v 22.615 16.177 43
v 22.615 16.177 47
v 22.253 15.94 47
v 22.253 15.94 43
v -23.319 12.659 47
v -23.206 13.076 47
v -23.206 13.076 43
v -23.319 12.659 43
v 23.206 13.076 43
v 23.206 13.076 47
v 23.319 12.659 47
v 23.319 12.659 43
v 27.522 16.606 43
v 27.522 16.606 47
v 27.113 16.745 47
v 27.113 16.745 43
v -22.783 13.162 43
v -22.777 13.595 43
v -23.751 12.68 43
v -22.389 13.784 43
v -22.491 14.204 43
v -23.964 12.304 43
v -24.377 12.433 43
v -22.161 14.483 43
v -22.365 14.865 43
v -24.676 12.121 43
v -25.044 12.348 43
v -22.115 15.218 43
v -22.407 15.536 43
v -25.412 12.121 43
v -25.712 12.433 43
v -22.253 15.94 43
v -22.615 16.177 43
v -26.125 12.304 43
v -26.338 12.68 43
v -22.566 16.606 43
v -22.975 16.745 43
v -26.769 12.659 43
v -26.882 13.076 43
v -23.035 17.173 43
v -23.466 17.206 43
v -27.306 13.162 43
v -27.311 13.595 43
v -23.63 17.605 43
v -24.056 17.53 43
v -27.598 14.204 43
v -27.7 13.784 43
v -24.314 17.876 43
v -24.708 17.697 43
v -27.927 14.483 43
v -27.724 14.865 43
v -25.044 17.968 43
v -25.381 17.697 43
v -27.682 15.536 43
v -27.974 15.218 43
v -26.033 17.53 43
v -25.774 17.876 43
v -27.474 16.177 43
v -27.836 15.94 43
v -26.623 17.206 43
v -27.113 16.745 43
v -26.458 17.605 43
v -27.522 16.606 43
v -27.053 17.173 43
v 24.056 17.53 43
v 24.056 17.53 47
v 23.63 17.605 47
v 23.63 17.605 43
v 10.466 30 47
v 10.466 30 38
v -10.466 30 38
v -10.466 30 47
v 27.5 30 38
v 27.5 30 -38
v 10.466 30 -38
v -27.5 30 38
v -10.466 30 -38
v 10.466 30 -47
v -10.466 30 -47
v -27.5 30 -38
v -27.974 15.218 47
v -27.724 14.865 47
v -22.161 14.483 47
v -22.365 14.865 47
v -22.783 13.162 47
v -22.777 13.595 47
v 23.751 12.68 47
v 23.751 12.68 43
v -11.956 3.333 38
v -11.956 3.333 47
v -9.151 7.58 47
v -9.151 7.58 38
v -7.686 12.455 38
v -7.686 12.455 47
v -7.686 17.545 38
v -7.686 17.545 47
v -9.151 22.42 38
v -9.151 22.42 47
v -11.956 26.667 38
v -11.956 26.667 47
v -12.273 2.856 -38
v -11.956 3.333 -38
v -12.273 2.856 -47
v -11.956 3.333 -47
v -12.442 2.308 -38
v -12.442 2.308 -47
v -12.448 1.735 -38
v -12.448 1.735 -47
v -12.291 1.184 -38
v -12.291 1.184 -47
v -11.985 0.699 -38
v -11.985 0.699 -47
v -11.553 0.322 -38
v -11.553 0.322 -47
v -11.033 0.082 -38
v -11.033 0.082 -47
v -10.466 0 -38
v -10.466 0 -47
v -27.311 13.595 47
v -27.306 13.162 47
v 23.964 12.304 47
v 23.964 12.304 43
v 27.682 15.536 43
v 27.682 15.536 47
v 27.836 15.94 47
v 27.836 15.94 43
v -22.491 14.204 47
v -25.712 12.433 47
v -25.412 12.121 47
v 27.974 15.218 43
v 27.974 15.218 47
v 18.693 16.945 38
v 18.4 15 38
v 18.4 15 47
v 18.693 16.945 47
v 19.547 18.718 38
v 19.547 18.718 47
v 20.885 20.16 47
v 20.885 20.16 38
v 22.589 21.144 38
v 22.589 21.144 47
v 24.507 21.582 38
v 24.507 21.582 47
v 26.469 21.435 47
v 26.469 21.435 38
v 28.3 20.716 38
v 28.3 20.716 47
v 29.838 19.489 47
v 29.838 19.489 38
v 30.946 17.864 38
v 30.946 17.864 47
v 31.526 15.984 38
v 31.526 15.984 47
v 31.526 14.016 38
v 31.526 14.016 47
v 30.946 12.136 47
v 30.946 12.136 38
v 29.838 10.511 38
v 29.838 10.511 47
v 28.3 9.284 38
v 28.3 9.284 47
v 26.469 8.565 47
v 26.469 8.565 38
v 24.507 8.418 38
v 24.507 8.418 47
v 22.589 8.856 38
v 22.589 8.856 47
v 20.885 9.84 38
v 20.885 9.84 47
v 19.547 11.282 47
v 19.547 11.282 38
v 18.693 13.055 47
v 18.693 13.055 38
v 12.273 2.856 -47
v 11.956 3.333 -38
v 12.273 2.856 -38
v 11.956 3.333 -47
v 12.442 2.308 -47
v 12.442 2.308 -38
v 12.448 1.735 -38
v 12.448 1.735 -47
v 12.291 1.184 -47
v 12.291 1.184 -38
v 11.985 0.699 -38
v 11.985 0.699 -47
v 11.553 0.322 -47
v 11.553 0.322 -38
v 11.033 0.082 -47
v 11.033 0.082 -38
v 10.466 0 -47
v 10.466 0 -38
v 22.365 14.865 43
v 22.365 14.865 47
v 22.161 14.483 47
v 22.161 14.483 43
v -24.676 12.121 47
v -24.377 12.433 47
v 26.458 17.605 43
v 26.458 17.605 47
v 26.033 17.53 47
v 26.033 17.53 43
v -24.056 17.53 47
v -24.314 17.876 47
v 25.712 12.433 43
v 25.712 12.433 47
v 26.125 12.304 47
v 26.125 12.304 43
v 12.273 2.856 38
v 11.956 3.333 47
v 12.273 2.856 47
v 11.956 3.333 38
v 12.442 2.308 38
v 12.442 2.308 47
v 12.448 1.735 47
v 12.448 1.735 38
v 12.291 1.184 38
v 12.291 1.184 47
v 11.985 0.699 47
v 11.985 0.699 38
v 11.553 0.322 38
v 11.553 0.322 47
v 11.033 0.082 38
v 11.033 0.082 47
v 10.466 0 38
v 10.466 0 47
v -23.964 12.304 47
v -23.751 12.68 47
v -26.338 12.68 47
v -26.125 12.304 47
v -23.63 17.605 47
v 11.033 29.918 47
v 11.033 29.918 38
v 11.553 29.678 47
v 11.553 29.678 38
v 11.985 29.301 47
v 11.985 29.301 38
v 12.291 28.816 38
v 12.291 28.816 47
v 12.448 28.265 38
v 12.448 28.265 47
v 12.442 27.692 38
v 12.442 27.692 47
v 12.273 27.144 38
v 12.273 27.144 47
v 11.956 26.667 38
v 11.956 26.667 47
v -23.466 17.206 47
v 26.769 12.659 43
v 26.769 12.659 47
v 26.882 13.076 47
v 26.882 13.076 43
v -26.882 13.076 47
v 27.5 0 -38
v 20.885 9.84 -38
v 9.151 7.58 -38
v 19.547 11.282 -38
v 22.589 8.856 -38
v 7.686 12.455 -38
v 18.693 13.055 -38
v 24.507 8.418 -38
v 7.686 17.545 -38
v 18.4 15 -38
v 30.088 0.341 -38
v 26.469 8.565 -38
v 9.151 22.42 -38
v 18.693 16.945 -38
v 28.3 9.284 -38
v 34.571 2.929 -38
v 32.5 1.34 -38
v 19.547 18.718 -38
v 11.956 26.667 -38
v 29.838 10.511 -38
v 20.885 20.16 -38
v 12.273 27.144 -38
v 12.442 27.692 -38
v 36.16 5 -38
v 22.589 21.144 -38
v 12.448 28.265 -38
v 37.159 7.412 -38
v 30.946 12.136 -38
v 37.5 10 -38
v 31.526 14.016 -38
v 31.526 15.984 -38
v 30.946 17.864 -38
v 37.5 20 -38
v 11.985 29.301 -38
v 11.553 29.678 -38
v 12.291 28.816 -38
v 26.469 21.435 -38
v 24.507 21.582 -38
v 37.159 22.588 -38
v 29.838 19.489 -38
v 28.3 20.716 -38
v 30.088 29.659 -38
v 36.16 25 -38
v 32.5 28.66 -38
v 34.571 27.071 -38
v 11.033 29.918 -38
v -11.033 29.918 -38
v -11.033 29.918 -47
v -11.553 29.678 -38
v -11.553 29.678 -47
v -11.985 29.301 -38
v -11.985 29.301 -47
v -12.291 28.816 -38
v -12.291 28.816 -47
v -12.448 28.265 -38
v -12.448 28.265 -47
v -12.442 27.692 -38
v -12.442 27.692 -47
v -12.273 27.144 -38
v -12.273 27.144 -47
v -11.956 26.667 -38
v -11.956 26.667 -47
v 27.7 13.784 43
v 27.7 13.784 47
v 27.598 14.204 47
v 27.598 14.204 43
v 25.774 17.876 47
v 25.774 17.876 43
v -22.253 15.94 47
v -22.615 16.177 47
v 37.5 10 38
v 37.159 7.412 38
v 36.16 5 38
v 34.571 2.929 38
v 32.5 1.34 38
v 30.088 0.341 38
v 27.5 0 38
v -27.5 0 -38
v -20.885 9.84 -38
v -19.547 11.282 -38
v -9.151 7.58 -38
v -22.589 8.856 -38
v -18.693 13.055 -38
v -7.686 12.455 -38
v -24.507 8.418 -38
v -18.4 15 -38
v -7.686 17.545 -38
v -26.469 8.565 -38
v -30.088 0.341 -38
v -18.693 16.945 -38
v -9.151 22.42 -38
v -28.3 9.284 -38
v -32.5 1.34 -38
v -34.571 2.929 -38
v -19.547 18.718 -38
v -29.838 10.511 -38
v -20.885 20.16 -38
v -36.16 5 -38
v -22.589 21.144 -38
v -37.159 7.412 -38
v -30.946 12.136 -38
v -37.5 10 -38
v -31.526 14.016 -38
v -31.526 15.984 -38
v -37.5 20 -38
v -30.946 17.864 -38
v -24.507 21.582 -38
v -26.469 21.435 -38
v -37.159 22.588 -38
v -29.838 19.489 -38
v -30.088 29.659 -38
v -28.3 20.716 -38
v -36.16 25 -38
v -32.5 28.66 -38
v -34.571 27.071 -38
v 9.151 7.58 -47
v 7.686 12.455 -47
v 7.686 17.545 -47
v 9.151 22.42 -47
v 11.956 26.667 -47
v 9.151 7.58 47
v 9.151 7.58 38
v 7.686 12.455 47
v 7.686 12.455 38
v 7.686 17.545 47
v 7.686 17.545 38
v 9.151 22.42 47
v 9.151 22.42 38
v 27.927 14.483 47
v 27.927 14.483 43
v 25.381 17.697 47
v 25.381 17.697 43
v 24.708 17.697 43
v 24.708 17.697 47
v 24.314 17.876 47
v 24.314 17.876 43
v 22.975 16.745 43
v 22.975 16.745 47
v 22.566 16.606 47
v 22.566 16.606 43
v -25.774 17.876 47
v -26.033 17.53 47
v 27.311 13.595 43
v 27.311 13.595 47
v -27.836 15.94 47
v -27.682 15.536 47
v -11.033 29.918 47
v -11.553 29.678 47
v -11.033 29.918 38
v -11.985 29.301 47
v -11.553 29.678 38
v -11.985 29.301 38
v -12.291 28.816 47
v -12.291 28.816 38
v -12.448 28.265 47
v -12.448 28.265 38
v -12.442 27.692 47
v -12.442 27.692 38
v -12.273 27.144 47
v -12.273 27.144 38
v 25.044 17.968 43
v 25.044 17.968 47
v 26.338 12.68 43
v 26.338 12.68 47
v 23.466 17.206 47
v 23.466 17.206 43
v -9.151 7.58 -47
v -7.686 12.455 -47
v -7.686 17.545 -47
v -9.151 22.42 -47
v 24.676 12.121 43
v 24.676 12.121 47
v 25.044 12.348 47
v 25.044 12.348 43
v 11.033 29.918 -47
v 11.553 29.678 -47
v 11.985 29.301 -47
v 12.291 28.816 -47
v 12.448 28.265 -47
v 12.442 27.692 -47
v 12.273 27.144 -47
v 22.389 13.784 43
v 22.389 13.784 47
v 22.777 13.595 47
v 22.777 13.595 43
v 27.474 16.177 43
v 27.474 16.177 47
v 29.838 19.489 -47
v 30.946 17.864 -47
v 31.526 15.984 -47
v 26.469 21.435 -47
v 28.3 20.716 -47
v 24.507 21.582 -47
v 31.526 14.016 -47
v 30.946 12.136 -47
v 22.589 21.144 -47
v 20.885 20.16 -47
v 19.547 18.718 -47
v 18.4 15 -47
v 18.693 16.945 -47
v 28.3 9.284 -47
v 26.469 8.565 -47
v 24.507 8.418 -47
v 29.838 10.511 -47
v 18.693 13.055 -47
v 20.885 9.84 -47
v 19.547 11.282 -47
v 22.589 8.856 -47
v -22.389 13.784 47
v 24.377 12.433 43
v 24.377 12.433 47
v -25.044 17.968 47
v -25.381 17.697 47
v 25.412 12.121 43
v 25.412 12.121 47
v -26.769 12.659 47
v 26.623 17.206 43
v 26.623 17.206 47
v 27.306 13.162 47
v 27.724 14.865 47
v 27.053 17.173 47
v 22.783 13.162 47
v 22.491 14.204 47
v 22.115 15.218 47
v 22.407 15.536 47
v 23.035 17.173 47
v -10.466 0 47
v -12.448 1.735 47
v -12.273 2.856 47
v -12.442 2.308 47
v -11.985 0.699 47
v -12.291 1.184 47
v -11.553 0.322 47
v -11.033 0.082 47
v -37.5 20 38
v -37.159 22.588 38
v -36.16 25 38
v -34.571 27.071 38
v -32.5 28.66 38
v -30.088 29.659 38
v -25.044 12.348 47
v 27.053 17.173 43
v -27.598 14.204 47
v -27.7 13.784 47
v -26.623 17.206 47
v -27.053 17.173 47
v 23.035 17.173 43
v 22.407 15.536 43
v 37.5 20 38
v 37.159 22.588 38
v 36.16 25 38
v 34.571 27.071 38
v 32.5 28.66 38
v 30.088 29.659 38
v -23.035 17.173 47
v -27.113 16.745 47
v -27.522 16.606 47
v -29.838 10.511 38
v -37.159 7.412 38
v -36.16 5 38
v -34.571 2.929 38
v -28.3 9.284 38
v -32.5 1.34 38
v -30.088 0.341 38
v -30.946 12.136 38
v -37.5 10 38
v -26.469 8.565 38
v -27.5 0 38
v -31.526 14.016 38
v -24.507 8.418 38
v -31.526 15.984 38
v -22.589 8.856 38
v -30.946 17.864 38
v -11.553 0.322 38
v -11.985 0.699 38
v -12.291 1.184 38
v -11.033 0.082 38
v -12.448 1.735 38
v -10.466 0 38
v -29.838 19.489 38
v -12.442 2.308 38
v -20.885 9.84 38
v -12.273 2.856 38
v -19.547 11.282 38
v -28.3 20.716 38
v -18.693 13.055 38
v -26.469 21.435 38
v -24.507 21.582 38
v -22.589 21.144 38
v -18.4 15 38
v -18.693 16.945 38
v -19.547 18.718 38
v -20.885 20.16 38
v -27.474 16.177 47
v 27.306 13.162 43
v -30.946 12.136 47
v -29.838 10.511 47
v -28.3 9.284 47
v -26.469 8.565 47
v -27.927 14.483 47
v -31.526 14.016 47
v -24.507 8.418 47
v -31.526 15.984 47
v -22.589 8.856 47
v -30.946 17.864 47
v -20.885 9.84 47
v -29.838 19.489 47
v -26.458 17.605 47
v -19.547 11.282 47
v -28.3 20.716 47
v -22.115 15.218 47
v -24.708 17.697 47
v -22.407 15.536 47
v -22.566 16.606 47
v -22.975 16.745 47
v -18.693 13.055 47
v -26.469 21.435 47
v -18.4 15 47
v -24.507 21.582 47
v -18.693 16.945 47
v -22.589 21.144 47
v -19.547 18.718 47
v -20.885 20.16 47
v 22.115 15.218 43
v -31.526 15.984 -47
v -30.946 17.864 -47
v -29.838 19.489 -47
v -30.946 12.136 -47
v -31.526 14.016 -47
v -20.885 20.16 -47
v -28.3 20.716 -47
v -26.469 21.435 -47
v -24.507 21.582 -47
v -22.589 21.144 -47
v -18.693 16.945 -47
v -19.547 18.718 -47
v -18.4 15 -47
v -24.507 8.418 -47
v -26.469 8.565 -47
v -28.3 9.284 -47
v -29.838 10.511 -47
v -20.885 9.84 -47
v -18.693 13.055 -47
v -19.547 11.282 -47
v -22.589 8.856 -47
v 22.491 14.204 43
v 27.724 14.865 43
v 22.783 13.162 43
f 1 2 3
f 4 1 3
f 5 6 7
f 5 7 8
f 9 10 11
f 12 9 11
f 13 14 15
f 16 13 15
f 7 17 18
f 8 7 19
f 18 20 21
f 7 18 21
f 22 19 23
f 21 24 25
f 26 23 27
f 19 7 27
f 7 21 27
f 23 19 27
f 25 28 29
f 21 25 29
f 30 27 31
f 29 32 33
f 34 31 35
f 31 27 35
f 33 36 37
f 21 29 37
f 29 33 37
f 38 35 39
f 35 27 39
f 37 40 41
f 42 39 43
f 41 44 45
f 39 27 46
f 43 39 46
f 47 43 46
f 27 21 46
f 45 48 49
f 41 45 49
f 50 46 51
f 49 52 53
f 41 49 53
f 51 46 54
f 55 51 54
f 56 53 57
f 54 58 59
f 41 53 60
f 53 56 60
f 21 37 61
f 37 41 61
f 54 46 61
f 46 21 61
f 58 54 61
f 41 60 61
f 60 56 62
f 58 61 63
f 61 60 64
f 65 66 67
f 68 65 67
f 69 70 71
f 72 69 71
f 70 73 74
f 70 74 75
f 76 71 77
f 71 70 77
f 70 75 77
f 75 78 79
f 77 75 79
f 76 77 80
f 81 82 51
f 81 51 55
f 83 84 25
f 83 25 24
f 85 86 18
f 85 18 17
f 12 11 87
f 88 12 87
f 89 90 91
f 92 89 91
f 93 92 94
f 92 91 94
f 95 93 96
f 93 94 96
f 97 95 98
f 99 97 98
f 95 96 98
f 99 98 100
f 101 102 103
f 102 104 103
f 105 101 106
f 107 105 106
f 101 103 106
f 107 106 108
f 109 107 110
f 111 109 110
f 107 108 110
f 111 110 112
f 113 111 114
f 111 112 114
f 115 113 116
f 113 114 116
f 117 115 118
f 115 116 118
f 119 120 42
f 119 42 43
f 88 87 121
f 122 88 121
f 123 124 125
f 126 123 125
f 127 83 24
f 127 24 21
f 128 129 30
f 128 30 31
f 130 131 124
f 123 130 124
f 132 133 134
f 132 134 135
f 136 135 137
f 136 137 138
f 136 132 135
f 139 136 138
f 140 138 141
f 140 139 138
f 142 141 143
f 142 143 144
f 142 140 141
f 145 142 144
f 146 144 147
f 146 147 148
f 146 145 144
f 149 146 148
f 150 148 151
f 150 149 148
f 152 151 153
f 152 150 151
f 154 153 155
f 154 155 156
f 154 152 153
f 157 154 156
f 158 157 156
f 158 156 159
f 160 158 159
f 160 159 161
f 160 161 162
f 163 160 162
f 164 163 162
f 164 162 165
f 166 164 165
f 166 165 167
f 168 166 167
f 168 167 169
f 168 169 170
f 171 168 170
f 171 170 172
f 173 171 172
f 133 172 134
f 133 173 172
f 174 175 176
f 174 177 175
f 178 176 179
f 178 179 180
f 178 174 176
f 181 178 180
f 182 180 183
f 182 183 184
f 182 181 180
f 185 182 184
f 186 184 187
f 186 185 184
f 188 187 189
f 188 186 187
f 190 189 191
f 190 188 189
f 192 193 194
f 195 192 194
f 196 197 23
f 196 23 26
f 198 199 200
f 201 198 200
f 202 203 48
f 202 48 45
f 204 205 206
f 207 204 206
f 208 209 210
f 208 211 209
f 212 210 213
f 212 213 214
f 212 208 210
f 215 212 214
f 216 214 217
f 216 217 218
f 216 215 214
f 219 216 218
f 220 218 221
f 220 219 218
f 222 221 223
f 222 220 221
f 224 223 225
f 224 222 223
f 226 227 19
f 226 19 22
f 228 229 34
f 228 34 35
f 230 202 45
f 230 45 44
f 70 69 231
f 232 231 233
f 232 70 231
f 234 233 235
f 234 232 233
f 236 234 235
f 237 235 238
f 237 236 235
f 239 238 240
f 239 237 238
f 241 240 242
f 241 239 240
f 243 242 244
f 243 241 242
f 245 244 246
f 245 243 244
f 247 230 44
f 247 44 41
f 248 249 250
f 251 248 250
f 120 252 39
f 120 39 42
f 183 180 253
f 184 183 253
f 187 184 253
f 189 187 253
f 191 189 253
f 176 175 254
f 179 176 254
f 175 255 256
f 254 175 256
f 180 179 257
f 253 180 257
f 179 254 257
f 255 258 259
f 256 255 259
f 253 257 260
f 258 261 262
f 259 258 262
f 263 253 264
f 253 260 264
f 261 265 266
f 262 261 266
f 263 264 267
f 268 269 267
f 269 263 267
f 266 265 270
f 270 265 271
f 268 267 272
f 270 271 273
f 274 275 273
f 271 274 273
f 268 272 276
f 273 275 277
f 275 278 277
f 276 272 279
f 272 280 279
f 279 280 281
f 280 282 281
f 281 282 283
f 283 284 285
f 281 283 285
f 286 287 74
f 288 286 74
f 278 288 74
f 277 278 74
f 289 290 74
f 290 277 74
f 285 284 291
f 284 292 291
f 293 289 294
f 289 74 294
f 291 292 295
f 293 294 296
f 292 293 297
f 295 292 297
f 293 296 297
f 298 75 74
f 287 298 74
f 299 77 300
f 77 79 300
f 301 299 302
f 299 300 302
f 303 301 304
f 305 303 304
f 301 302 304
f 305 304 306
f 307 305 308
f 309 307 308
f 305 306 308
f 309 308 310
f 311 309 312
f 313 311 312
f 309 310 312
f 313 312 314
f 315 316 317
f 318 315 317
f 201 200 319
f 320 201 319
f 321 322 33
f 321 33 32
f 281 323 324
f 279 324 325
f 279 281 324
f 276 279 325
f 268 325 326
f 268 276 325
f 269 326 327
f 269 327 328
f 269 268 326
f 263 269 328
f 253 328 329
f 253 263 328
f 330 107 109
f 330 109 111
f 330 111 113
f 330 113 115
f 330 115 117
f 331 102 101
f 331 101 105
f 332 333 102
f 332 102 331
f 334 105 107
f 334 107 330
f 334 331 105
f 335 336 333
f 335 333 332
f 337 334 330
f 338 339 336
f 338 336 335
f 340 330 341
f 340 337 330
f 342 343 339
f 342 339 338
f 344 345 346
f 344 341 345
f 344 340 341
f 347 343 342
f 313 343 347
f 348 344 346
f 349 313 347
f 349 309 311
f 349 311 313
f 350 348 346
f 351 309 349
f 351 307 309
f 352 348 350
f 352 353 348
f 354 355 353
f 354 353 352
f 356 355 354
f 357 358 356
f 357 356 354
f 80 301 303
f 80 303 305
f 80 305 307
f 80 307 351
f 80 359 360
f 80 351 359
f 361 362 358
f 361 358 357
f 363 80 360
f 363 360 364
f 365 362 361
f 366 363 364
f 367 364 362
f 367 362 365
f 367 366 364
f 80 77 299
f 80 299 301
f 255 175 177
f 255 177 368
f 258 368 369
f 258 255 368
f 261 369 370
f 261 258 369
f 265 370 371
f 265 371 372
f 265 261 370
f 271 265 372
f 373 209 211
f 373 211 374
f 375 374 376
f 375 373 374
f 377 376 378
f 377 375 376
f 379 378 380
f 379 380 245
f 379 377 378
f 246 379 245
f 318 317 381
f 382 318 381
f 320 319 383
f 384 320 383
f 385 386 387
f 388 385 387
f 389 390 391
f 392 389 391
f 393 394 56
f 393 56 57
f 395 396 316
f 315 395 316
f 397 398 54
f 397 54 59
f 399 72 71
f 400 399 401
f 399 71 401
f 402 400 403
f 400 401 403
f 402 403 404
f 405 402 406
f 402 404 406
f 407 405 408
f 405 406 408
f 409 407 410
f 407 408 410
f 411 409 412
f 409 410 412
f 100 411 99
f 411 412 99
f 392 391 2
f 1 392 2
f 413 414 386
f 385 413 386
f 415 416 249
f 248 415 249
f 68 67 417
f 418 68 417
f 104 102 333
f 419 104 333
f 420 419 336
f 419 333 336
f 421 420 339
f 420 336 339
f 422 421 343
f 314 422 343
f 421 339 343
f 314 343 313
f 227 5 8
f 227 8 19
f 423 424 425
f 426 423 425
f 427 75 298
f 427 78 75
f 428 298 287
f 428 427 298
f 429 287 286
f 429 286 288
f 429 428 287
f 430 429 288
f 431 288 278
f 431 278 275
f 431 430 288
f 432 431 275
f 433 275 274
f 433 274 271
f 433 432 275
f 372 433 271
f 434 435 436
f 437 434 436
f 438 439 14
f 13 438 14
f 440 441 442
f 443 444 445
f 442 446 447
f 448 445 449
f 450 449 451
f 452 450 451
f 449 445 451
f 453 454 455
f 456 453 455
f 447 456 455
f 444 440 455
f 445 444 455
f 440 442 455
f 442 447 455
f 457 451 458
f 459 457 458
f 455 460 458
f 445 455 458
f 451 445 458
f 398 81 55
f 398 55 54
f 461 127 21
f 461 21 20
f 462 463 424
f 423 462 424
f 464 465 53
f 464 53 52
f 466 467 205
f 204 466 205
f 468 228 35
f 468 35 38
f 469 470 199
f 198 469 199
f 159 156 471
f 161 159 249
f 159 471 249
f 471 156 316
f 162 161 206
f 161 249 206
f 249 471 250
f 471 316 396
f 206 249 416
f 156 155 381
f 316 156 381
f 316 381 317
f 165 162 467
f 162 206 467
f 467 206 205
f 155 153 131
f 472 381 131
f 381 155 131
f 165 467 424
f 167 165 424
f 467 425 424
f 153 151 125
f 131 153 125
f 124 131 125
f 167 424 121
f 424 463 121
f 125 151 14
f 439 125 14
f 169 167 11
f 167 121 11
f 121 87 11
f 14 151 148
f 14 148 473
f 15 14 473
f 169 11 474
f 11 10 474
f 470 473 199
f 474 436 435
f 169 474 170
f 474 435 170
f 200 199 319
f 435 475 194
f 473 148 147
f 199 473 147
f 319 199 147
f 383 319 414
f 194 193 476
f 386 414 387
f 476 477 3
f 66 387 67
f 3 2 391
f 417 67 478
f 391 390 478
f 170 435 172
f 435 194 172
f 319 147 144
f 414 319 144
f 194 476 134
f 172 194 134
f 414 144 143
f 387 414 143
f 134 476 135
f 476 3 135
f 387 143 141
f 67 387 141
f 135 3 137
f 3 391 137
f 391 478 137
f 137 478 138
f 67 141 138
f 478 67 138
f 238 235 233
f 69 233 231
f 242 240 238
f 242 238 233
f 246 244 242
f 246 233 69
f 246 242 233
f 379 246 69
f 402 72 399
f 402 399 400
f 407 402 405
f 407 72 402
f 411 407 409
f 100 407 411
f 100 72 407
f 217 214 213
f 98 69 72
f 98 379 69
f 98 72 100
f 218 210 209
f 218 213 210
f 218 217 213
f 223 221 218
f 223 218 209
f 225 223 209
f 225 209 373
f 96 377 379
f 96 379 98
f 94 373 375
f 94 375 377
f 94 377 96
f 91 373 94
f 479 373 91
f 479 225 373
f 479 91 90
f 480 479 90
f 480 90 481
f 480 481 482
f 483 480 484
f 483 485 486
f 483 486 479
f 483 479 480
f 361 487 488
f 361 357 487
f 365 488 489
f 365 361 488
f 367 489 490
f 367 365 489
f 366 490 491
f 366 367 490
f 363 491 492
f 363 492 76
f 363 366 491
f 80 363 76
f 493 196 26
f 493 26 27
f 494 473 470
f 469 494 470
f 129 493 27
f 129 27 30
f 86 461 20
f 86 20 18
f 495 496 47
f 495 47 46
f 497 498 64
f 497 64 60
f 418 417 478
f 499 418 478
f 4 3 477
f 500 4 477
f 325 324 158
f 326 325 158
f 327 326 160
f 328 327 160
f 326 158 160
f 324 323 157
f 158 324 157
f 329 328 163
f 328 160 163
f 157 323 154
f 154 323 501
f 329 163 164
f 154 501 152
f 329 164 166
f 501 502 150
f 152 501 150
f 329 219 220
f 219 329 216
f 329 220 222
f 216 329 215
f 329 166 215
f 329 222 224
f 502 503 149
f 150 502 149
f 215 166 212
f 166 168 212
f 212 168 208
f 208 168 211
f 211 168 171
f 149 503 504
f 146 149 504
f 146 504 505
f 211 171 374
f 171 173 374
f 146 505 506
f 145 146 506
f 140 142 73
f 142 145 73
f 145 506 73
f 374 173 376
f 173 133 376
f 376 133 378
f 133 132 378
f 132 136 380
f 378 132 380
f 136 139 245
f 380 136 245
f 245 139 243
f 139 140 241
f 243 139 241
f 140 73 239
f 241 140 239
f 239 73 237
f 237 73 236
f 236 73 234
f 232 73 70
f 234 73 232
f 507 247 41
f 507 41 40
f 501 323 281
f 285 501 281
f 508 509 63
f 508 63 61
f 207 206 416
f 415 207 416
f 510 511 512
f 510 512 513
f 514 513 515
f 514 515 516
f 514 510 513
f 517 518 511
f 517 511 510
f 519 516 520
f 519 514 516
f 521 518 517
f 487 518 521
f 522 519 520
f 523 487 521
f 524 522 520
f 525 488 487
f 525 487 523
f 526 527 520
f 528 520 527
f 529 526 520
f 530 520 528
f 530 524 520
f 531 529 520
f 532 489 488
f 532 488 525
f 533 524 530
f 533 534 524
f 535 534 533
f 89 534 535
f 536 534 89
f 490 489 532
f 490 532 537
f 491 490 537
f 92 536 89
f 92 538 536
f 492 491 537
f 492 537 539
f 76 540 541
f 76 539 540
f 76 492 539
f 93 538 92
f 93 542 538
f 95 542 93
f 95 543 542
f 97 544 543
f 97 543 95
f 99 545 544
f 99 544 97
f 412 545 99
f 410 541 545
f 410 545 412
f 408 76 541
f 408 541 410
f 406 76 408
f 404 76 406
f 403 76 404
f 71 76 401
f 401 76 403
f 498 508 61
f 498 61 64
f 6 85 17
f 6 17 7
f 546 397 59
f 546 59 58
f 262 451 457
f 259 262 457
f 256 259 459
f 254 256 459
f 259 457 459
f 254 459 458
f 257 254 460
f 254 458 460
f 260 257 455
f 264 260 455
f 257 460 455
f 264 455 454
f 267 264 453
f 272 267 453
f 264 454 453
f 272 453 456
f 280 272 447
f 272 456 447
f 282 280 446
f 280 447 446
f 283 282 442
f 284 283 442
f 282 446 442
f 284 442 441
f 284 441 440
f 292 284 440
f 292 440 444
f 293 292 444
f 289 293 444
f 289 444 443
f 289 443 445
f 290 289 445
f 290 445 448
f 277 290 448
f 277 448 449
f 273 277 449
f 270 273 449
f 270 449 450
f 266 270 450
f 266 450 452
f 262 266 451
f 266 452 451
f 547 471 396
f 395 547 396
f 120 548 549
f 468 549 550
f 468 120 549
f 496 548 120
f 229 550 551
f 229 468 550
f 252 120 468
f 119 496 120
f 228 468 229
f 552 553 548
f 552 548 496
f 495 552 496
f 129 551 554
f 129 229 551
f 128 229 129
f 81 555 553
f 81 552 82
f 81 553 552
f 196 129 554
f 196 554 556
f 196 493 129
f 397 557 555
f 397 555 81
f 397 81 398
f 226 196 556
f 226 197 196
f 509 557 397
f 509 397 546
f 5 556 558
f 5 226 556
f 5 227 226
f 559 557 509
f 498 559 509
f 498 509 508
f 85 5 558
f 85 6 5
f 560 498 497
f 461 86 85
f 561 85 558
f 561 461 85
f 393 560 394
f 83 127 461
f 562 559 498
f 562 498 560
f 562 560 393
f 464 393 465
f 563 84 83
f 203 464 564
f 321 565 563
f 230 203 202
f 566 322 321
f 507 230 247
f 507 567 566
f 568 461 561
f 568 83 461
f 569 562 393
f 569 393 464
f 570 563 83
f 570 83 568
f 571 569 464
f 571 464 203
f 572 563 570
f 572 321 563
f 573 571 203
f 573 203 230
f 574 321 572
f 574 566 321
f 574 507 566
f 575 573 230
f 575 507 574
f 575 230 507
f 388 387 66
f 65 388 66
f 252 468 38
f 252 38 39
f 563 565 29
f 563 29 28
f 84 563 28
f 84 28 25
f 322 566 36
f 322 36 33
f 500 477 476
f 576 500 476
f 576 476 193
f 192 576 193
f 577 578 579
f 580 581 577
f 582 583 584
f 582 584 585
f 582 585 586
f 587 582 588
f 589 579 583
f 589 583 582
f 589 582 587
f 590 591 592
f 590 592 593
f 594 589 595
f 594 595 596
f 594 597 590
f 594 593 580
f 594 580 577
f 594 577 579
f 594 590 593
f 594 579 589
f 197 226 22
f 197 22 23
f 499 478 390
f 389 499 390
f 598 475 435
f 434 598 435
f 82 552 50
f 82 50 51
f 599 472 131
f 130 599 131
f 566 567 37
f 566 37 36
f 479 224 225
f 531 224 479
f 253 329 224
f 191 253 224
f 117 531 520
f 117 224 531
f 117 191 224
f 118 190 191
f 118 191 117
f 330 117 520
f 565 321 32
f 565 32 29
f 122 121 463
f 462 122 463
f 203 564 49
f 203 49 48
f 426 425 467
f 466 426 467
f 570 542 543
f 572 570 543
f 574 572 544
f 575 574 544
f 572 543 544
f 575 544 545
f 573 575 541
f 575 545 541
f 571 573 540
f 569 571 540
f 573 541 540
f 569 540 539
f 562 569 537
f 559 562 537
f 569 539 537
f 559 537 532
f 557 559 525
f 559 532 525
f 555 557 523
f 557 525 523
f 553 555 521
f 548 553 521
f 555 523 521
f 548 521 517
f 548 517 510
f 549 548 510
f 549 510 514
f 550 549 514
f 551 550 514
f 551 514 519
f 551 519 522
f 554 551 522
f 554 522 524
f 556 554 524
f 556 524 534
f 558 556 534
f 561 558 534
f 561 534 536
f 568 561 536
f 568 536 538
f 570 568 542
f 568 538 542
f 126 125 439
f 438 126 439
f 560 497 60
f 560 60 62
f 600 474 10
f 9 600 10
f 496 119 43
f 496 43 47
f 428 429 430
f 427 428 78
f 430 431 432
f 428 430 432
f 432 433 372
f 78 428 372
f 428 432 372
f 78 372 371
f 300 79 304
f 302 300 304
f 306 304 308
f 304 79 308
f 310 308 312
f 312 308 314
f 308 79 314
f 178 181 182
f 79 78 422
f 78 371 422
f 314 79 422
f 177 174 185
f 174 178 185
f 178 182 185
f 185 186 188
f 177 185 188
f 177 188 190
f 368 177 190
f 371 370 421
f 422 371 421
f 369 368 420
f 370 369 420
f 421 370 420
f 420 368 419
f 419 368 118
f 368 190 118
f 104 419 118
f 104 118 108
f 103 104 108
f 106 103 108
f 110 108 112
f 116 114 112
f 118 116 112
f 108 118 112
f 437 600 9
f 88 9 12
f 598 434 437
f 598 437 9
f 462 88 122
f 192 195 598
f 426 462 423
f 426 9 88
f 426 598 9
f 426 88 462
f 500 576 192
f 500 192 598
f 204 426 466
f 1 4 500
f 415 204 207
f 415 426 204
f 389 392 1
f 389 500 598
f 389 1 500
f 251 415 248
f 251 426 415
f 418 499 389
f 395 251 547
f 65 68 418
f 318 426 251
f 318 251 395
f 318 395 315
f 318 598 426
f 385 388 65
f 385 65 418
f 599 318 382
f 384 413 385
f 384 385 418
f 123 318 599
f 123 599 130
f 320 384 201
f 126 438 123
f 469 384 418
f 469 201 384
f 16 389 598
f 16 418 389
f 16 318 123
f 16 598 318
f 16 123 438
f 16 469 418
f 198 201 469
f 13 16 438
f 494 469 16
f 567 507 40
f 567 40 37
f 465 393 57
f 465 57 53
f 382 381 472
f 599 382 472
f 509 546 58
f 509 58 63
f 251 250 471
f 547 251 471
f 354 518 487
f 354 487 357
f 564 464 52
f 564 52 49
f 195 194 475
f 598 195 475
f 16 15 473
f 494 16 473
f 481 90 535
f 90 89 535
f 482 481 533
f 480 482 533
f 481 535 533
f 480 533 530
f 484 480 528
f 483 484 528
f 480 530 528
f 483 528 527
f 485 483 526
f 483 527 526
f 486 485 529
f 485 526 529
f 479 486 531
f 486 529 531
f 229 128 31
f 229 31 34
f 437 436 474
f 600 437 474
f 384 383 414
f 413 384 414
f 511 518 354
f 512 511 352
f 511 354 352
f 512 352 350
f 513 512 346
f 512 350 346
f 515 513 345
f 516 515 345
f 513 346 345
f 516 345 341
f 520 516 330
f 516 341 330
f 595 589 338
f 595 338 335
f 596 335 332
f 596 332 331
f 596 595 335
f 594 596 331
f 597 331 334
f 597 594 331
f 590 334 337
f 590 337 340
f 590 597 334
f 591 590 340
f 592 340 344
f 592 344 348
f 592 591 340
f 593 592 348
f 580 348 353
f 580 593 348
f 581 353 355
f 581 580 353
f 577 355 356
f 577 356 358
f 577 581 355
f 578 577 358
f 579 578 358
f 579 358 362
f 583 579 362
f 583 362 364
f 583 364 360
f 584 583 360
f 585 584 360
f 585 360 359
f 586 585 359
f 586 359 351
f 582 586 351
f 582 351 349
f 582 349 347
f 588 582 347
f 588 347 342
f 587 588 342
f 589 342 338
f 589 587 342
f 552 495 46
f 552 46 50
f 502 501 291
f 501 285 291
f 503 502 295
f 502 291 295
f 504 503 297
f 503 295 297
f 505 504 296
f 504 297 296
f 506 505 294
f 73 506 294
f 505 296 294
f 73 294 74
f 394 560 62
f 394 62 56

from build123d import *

# Parameters (mm, degrees)
SKETCH1_W           = 75
SKETCH1_H           = 94
BOSS_EXTRUDE1_DEPTH = 30
SKETCH2_W           = 20.025762067
SKETCH2_H           = 30
CUT_EXTRUDE5_DEPTH  = 9
SKETCH7_W           = 20.025762067
SKETCH7_H           = 30
CUT_EXTRUDE6_DEPTH  = 9
SKETCH8_R           = 6.6
BOSS_EXTRUDE2_DEPTH = 9
BOSS_EXTRUDE3_START = 9
SKETCH9_R           = 6.6
BOSS_EXTRUDE3_DEPTH = 9
FILLET1_R           = 10
CUT_EXTRUDE7_DEPTH  = 9
CUT_EXTRUDE8_START  = -9
CUT_EXTRUDE8_DEPTH  = 9
FILLET2_R           = 2
CUT_EXTRUDE10_DEPTH = 4
SKETCH14_W          = 37.5
SKETCH14_H          = 30
CUT_EXTRUDE11_DEPTH = 94


with BuildPart() as part:
    # Sketch1 → Boss-Extrude1 (new body)
    with BuildSketch(Plane(origin=(0, 0, 0), x_dir=(1, 0, 0), z_dir=(0, 1, 0))):
        Rectangle(SKETCH1_W, SKETCH1_H)
    extrude(amount=BOSS_EXTRUDE1_DEPTH)

    # Sketch2 → Cut-Extrude5 (cut)
    with BuildSketch(Plane.XY.offset(47)):
        with Locations((-27.487118966, 15)):
            Rectangle(SKETCH2_W, SKETCH2_H)
    extrude(amount=-CUT_EXTRUDE5_DEPTH, mode=Mode.SUBTRACT)

    # Sketch7 → Cut-Extrude6 (cut)
    with BuildSketch(Plane(origin=(0, 0, -47), x_dir=(-1, 0, 0), z_dir=(0, 0, -1))):
        with Locations((27.487118966, 15)):
            Rectangle(SKETCH7_W, SKETCH7_H)
    extrude(amount=-CUT_EXTRUDE6_DEPTH, mode=Mode.SUBTRACT)

    # Sketch8 → Boss-Extrude2 (add)
    with BuildSketch(Plane.XY.offset(38)):
        with Locations((-25, 15)):
            Circle(SKETCH8_R)
    extrude(amount=BOSS_EXTRUDE2_DEPTH)

    # Sketch9 → Boss-Extrude3 (add)
    with BuildSketch(Plane(origin=(0, 0, -38), x_dir=(-1, 0, 0), z_dir=(0, 0, -1)).offset(BOSS_EXTRUDE3_START)):
        with Locations(Location((25, 15, 0), (0, 0, 180))):
            Circle(SKETCH9_R)
    extrude(amount=-BOSS_EXTRUDE3_DEPTH)

    # Fillet1
    fillet1_edges = [part.edges().sort_by_distance(p)[0] for p in [
        (-37.5, 0, 0),
        (-37.5, 30, 0),
    ]]
    fillet(fillet1_edges, radius=FILLET1_R)

    # Sketch10 → Cut-Extrude7 (cut)
    with BuildSketch(Plane.XY.offset(47)):
        with BuildLine():
            Line((-15.986121811, 30), (-17.474237933, 30))
            Line((-17.474237933, 30), (-17.474237933, 0))
            Line((-17.474237933, 0), (-15.986121811, 0))
            ThreePointArc((-15.986121811, 0), (-7.5, 15), (-15.986121811, 30))
        make_face()
    extrude(amount=-CUT_EXTRUDE7_DEPTH, mode=Mode.SUBTRACT)

    # Sketch11 → Cut-Extrude8 (cut)
    with BuildSketch(Plane(origin=(0, 0, -47), x_dir=(-1, 0, 0), z_dir=(0, 0, -1)).offset(CUT_EXTRUDE8_START)):
        with BuildLine():
            Line((15.986121811, 30), (17.474237933, 30))
            Line((17.474237933, 30), (17.474237933, 0))
            Line((17.474237933, 0), (15.986121811, 0))
            ThreePointArc((15.986121811, 0), (7.5, 15), (15.986121811, 30))
        make_face()
    extrude(amount=CUT_EXTRUDE8_DEPTH, mode=Mode.SUBTRACT)

    # Fillet2
    fillet2_edges = [part.edges().sort_by_distance(p)[0] for p in [
        (-15.986121811, 30, 42.5),
        (-15.986121811, 0, 42.5),
        (-15.986121811, 0, -42.5),
        (-15.986121811, 30, -42.5),
    ]]
    fillet(fillet2_edges, radius=FILLET2_R)

    # Sketch13 → Cut-Extrude10 (cut)
    with BuildSketch(Plane.XY.offset(47)):
        Polygon((-26.622500709, 17.20554754), (-26.458244341, 17.605297016), (-26.032711731, 17.529786775), (-25.774202126, 17.876128488), (-25.380817039, 17.697164883), (-25.044297307, 17.96833691), (-24.707777575, 17.697164883), (-24.314392488, 17.876128488), (-24.055882883, 17.529786775), (-23.630350274, 17.605297016), (-23.466093905, 17.20554754), (-23.035151551, 17.172859831), (-22.97546925, 16.744820322), (-22.566194846, 16.605988553), (-22.614836671, 16.176554308), (-22.252946432, 15.940301788), (-22.406856039, 15.53645574), (-22.115088859, 15.217627085), (-22.364595541, 14.864744365), (-22.161284226, 14.483372752), (-22.490710561, 14.20362628), (-22.388629908, 13.783674689), (-22.777276827, 13.594641965), (-22.782840939, 13.1624975), (-23.206288328, 13.076056145), (-23.319147592, 12.658872031), (-23.750788692, 12.680453474), (-23.963851745, 12.304442924), (-24.37656496, 12.432691122), (-24.676444267, 12.121480262), (-25.044297307, 12.34833691), (-25.412150348, 12.121480262), (-25.712029654, 12.432691122), (-26.124742869, 12.304442924), (-26.337805922, 12.680453474), (-26.769447023, 12.658872031), (-26.882306286, 13.076056145), (-27.305753675, 13.1624975), (-27.311317787, 13.594641965), (-27.699964706, 13.783674689), (-27.597884053, 14.20362628), (-27.927310388, 14.483372752), (-27.723999073, 14.864744365), (-27.973505755, 15.217627085), (-27.681738575, 15.53645574), (-27.835648182, 15.940301788), (-27.473757943, 16.176554308), (-27.522399768, 16.605988553), (-27.113125364, 16.744820322), (-27.053443063, 17.172859831), align=None)
    extrude(amount=-CUT_EXTRUDE10_DEPTH, mode=Mode.SUBTRACT)

    # Sketch14 → Cut-Extrude11 (cut)
    with BuildSketch(Plane.XY.offset(47)):
        with Locations((18.75, 15)):
            Rectangle(SKETCH14_W, SKETCH14_H)
    extrude(amount=-CUT_EXTRUDE11_DEPTH, mode=Mode.SUBTRACT)

    # Mirror2: part across plane


with BuildPart() as part_1:
    add(part.part)
    add(part.part.mirror(Plane(origin=(0, 0, -47), x_dir=(0, 0, 1), z_dir=(-1, 0, 0))))


solid = part_1.part
